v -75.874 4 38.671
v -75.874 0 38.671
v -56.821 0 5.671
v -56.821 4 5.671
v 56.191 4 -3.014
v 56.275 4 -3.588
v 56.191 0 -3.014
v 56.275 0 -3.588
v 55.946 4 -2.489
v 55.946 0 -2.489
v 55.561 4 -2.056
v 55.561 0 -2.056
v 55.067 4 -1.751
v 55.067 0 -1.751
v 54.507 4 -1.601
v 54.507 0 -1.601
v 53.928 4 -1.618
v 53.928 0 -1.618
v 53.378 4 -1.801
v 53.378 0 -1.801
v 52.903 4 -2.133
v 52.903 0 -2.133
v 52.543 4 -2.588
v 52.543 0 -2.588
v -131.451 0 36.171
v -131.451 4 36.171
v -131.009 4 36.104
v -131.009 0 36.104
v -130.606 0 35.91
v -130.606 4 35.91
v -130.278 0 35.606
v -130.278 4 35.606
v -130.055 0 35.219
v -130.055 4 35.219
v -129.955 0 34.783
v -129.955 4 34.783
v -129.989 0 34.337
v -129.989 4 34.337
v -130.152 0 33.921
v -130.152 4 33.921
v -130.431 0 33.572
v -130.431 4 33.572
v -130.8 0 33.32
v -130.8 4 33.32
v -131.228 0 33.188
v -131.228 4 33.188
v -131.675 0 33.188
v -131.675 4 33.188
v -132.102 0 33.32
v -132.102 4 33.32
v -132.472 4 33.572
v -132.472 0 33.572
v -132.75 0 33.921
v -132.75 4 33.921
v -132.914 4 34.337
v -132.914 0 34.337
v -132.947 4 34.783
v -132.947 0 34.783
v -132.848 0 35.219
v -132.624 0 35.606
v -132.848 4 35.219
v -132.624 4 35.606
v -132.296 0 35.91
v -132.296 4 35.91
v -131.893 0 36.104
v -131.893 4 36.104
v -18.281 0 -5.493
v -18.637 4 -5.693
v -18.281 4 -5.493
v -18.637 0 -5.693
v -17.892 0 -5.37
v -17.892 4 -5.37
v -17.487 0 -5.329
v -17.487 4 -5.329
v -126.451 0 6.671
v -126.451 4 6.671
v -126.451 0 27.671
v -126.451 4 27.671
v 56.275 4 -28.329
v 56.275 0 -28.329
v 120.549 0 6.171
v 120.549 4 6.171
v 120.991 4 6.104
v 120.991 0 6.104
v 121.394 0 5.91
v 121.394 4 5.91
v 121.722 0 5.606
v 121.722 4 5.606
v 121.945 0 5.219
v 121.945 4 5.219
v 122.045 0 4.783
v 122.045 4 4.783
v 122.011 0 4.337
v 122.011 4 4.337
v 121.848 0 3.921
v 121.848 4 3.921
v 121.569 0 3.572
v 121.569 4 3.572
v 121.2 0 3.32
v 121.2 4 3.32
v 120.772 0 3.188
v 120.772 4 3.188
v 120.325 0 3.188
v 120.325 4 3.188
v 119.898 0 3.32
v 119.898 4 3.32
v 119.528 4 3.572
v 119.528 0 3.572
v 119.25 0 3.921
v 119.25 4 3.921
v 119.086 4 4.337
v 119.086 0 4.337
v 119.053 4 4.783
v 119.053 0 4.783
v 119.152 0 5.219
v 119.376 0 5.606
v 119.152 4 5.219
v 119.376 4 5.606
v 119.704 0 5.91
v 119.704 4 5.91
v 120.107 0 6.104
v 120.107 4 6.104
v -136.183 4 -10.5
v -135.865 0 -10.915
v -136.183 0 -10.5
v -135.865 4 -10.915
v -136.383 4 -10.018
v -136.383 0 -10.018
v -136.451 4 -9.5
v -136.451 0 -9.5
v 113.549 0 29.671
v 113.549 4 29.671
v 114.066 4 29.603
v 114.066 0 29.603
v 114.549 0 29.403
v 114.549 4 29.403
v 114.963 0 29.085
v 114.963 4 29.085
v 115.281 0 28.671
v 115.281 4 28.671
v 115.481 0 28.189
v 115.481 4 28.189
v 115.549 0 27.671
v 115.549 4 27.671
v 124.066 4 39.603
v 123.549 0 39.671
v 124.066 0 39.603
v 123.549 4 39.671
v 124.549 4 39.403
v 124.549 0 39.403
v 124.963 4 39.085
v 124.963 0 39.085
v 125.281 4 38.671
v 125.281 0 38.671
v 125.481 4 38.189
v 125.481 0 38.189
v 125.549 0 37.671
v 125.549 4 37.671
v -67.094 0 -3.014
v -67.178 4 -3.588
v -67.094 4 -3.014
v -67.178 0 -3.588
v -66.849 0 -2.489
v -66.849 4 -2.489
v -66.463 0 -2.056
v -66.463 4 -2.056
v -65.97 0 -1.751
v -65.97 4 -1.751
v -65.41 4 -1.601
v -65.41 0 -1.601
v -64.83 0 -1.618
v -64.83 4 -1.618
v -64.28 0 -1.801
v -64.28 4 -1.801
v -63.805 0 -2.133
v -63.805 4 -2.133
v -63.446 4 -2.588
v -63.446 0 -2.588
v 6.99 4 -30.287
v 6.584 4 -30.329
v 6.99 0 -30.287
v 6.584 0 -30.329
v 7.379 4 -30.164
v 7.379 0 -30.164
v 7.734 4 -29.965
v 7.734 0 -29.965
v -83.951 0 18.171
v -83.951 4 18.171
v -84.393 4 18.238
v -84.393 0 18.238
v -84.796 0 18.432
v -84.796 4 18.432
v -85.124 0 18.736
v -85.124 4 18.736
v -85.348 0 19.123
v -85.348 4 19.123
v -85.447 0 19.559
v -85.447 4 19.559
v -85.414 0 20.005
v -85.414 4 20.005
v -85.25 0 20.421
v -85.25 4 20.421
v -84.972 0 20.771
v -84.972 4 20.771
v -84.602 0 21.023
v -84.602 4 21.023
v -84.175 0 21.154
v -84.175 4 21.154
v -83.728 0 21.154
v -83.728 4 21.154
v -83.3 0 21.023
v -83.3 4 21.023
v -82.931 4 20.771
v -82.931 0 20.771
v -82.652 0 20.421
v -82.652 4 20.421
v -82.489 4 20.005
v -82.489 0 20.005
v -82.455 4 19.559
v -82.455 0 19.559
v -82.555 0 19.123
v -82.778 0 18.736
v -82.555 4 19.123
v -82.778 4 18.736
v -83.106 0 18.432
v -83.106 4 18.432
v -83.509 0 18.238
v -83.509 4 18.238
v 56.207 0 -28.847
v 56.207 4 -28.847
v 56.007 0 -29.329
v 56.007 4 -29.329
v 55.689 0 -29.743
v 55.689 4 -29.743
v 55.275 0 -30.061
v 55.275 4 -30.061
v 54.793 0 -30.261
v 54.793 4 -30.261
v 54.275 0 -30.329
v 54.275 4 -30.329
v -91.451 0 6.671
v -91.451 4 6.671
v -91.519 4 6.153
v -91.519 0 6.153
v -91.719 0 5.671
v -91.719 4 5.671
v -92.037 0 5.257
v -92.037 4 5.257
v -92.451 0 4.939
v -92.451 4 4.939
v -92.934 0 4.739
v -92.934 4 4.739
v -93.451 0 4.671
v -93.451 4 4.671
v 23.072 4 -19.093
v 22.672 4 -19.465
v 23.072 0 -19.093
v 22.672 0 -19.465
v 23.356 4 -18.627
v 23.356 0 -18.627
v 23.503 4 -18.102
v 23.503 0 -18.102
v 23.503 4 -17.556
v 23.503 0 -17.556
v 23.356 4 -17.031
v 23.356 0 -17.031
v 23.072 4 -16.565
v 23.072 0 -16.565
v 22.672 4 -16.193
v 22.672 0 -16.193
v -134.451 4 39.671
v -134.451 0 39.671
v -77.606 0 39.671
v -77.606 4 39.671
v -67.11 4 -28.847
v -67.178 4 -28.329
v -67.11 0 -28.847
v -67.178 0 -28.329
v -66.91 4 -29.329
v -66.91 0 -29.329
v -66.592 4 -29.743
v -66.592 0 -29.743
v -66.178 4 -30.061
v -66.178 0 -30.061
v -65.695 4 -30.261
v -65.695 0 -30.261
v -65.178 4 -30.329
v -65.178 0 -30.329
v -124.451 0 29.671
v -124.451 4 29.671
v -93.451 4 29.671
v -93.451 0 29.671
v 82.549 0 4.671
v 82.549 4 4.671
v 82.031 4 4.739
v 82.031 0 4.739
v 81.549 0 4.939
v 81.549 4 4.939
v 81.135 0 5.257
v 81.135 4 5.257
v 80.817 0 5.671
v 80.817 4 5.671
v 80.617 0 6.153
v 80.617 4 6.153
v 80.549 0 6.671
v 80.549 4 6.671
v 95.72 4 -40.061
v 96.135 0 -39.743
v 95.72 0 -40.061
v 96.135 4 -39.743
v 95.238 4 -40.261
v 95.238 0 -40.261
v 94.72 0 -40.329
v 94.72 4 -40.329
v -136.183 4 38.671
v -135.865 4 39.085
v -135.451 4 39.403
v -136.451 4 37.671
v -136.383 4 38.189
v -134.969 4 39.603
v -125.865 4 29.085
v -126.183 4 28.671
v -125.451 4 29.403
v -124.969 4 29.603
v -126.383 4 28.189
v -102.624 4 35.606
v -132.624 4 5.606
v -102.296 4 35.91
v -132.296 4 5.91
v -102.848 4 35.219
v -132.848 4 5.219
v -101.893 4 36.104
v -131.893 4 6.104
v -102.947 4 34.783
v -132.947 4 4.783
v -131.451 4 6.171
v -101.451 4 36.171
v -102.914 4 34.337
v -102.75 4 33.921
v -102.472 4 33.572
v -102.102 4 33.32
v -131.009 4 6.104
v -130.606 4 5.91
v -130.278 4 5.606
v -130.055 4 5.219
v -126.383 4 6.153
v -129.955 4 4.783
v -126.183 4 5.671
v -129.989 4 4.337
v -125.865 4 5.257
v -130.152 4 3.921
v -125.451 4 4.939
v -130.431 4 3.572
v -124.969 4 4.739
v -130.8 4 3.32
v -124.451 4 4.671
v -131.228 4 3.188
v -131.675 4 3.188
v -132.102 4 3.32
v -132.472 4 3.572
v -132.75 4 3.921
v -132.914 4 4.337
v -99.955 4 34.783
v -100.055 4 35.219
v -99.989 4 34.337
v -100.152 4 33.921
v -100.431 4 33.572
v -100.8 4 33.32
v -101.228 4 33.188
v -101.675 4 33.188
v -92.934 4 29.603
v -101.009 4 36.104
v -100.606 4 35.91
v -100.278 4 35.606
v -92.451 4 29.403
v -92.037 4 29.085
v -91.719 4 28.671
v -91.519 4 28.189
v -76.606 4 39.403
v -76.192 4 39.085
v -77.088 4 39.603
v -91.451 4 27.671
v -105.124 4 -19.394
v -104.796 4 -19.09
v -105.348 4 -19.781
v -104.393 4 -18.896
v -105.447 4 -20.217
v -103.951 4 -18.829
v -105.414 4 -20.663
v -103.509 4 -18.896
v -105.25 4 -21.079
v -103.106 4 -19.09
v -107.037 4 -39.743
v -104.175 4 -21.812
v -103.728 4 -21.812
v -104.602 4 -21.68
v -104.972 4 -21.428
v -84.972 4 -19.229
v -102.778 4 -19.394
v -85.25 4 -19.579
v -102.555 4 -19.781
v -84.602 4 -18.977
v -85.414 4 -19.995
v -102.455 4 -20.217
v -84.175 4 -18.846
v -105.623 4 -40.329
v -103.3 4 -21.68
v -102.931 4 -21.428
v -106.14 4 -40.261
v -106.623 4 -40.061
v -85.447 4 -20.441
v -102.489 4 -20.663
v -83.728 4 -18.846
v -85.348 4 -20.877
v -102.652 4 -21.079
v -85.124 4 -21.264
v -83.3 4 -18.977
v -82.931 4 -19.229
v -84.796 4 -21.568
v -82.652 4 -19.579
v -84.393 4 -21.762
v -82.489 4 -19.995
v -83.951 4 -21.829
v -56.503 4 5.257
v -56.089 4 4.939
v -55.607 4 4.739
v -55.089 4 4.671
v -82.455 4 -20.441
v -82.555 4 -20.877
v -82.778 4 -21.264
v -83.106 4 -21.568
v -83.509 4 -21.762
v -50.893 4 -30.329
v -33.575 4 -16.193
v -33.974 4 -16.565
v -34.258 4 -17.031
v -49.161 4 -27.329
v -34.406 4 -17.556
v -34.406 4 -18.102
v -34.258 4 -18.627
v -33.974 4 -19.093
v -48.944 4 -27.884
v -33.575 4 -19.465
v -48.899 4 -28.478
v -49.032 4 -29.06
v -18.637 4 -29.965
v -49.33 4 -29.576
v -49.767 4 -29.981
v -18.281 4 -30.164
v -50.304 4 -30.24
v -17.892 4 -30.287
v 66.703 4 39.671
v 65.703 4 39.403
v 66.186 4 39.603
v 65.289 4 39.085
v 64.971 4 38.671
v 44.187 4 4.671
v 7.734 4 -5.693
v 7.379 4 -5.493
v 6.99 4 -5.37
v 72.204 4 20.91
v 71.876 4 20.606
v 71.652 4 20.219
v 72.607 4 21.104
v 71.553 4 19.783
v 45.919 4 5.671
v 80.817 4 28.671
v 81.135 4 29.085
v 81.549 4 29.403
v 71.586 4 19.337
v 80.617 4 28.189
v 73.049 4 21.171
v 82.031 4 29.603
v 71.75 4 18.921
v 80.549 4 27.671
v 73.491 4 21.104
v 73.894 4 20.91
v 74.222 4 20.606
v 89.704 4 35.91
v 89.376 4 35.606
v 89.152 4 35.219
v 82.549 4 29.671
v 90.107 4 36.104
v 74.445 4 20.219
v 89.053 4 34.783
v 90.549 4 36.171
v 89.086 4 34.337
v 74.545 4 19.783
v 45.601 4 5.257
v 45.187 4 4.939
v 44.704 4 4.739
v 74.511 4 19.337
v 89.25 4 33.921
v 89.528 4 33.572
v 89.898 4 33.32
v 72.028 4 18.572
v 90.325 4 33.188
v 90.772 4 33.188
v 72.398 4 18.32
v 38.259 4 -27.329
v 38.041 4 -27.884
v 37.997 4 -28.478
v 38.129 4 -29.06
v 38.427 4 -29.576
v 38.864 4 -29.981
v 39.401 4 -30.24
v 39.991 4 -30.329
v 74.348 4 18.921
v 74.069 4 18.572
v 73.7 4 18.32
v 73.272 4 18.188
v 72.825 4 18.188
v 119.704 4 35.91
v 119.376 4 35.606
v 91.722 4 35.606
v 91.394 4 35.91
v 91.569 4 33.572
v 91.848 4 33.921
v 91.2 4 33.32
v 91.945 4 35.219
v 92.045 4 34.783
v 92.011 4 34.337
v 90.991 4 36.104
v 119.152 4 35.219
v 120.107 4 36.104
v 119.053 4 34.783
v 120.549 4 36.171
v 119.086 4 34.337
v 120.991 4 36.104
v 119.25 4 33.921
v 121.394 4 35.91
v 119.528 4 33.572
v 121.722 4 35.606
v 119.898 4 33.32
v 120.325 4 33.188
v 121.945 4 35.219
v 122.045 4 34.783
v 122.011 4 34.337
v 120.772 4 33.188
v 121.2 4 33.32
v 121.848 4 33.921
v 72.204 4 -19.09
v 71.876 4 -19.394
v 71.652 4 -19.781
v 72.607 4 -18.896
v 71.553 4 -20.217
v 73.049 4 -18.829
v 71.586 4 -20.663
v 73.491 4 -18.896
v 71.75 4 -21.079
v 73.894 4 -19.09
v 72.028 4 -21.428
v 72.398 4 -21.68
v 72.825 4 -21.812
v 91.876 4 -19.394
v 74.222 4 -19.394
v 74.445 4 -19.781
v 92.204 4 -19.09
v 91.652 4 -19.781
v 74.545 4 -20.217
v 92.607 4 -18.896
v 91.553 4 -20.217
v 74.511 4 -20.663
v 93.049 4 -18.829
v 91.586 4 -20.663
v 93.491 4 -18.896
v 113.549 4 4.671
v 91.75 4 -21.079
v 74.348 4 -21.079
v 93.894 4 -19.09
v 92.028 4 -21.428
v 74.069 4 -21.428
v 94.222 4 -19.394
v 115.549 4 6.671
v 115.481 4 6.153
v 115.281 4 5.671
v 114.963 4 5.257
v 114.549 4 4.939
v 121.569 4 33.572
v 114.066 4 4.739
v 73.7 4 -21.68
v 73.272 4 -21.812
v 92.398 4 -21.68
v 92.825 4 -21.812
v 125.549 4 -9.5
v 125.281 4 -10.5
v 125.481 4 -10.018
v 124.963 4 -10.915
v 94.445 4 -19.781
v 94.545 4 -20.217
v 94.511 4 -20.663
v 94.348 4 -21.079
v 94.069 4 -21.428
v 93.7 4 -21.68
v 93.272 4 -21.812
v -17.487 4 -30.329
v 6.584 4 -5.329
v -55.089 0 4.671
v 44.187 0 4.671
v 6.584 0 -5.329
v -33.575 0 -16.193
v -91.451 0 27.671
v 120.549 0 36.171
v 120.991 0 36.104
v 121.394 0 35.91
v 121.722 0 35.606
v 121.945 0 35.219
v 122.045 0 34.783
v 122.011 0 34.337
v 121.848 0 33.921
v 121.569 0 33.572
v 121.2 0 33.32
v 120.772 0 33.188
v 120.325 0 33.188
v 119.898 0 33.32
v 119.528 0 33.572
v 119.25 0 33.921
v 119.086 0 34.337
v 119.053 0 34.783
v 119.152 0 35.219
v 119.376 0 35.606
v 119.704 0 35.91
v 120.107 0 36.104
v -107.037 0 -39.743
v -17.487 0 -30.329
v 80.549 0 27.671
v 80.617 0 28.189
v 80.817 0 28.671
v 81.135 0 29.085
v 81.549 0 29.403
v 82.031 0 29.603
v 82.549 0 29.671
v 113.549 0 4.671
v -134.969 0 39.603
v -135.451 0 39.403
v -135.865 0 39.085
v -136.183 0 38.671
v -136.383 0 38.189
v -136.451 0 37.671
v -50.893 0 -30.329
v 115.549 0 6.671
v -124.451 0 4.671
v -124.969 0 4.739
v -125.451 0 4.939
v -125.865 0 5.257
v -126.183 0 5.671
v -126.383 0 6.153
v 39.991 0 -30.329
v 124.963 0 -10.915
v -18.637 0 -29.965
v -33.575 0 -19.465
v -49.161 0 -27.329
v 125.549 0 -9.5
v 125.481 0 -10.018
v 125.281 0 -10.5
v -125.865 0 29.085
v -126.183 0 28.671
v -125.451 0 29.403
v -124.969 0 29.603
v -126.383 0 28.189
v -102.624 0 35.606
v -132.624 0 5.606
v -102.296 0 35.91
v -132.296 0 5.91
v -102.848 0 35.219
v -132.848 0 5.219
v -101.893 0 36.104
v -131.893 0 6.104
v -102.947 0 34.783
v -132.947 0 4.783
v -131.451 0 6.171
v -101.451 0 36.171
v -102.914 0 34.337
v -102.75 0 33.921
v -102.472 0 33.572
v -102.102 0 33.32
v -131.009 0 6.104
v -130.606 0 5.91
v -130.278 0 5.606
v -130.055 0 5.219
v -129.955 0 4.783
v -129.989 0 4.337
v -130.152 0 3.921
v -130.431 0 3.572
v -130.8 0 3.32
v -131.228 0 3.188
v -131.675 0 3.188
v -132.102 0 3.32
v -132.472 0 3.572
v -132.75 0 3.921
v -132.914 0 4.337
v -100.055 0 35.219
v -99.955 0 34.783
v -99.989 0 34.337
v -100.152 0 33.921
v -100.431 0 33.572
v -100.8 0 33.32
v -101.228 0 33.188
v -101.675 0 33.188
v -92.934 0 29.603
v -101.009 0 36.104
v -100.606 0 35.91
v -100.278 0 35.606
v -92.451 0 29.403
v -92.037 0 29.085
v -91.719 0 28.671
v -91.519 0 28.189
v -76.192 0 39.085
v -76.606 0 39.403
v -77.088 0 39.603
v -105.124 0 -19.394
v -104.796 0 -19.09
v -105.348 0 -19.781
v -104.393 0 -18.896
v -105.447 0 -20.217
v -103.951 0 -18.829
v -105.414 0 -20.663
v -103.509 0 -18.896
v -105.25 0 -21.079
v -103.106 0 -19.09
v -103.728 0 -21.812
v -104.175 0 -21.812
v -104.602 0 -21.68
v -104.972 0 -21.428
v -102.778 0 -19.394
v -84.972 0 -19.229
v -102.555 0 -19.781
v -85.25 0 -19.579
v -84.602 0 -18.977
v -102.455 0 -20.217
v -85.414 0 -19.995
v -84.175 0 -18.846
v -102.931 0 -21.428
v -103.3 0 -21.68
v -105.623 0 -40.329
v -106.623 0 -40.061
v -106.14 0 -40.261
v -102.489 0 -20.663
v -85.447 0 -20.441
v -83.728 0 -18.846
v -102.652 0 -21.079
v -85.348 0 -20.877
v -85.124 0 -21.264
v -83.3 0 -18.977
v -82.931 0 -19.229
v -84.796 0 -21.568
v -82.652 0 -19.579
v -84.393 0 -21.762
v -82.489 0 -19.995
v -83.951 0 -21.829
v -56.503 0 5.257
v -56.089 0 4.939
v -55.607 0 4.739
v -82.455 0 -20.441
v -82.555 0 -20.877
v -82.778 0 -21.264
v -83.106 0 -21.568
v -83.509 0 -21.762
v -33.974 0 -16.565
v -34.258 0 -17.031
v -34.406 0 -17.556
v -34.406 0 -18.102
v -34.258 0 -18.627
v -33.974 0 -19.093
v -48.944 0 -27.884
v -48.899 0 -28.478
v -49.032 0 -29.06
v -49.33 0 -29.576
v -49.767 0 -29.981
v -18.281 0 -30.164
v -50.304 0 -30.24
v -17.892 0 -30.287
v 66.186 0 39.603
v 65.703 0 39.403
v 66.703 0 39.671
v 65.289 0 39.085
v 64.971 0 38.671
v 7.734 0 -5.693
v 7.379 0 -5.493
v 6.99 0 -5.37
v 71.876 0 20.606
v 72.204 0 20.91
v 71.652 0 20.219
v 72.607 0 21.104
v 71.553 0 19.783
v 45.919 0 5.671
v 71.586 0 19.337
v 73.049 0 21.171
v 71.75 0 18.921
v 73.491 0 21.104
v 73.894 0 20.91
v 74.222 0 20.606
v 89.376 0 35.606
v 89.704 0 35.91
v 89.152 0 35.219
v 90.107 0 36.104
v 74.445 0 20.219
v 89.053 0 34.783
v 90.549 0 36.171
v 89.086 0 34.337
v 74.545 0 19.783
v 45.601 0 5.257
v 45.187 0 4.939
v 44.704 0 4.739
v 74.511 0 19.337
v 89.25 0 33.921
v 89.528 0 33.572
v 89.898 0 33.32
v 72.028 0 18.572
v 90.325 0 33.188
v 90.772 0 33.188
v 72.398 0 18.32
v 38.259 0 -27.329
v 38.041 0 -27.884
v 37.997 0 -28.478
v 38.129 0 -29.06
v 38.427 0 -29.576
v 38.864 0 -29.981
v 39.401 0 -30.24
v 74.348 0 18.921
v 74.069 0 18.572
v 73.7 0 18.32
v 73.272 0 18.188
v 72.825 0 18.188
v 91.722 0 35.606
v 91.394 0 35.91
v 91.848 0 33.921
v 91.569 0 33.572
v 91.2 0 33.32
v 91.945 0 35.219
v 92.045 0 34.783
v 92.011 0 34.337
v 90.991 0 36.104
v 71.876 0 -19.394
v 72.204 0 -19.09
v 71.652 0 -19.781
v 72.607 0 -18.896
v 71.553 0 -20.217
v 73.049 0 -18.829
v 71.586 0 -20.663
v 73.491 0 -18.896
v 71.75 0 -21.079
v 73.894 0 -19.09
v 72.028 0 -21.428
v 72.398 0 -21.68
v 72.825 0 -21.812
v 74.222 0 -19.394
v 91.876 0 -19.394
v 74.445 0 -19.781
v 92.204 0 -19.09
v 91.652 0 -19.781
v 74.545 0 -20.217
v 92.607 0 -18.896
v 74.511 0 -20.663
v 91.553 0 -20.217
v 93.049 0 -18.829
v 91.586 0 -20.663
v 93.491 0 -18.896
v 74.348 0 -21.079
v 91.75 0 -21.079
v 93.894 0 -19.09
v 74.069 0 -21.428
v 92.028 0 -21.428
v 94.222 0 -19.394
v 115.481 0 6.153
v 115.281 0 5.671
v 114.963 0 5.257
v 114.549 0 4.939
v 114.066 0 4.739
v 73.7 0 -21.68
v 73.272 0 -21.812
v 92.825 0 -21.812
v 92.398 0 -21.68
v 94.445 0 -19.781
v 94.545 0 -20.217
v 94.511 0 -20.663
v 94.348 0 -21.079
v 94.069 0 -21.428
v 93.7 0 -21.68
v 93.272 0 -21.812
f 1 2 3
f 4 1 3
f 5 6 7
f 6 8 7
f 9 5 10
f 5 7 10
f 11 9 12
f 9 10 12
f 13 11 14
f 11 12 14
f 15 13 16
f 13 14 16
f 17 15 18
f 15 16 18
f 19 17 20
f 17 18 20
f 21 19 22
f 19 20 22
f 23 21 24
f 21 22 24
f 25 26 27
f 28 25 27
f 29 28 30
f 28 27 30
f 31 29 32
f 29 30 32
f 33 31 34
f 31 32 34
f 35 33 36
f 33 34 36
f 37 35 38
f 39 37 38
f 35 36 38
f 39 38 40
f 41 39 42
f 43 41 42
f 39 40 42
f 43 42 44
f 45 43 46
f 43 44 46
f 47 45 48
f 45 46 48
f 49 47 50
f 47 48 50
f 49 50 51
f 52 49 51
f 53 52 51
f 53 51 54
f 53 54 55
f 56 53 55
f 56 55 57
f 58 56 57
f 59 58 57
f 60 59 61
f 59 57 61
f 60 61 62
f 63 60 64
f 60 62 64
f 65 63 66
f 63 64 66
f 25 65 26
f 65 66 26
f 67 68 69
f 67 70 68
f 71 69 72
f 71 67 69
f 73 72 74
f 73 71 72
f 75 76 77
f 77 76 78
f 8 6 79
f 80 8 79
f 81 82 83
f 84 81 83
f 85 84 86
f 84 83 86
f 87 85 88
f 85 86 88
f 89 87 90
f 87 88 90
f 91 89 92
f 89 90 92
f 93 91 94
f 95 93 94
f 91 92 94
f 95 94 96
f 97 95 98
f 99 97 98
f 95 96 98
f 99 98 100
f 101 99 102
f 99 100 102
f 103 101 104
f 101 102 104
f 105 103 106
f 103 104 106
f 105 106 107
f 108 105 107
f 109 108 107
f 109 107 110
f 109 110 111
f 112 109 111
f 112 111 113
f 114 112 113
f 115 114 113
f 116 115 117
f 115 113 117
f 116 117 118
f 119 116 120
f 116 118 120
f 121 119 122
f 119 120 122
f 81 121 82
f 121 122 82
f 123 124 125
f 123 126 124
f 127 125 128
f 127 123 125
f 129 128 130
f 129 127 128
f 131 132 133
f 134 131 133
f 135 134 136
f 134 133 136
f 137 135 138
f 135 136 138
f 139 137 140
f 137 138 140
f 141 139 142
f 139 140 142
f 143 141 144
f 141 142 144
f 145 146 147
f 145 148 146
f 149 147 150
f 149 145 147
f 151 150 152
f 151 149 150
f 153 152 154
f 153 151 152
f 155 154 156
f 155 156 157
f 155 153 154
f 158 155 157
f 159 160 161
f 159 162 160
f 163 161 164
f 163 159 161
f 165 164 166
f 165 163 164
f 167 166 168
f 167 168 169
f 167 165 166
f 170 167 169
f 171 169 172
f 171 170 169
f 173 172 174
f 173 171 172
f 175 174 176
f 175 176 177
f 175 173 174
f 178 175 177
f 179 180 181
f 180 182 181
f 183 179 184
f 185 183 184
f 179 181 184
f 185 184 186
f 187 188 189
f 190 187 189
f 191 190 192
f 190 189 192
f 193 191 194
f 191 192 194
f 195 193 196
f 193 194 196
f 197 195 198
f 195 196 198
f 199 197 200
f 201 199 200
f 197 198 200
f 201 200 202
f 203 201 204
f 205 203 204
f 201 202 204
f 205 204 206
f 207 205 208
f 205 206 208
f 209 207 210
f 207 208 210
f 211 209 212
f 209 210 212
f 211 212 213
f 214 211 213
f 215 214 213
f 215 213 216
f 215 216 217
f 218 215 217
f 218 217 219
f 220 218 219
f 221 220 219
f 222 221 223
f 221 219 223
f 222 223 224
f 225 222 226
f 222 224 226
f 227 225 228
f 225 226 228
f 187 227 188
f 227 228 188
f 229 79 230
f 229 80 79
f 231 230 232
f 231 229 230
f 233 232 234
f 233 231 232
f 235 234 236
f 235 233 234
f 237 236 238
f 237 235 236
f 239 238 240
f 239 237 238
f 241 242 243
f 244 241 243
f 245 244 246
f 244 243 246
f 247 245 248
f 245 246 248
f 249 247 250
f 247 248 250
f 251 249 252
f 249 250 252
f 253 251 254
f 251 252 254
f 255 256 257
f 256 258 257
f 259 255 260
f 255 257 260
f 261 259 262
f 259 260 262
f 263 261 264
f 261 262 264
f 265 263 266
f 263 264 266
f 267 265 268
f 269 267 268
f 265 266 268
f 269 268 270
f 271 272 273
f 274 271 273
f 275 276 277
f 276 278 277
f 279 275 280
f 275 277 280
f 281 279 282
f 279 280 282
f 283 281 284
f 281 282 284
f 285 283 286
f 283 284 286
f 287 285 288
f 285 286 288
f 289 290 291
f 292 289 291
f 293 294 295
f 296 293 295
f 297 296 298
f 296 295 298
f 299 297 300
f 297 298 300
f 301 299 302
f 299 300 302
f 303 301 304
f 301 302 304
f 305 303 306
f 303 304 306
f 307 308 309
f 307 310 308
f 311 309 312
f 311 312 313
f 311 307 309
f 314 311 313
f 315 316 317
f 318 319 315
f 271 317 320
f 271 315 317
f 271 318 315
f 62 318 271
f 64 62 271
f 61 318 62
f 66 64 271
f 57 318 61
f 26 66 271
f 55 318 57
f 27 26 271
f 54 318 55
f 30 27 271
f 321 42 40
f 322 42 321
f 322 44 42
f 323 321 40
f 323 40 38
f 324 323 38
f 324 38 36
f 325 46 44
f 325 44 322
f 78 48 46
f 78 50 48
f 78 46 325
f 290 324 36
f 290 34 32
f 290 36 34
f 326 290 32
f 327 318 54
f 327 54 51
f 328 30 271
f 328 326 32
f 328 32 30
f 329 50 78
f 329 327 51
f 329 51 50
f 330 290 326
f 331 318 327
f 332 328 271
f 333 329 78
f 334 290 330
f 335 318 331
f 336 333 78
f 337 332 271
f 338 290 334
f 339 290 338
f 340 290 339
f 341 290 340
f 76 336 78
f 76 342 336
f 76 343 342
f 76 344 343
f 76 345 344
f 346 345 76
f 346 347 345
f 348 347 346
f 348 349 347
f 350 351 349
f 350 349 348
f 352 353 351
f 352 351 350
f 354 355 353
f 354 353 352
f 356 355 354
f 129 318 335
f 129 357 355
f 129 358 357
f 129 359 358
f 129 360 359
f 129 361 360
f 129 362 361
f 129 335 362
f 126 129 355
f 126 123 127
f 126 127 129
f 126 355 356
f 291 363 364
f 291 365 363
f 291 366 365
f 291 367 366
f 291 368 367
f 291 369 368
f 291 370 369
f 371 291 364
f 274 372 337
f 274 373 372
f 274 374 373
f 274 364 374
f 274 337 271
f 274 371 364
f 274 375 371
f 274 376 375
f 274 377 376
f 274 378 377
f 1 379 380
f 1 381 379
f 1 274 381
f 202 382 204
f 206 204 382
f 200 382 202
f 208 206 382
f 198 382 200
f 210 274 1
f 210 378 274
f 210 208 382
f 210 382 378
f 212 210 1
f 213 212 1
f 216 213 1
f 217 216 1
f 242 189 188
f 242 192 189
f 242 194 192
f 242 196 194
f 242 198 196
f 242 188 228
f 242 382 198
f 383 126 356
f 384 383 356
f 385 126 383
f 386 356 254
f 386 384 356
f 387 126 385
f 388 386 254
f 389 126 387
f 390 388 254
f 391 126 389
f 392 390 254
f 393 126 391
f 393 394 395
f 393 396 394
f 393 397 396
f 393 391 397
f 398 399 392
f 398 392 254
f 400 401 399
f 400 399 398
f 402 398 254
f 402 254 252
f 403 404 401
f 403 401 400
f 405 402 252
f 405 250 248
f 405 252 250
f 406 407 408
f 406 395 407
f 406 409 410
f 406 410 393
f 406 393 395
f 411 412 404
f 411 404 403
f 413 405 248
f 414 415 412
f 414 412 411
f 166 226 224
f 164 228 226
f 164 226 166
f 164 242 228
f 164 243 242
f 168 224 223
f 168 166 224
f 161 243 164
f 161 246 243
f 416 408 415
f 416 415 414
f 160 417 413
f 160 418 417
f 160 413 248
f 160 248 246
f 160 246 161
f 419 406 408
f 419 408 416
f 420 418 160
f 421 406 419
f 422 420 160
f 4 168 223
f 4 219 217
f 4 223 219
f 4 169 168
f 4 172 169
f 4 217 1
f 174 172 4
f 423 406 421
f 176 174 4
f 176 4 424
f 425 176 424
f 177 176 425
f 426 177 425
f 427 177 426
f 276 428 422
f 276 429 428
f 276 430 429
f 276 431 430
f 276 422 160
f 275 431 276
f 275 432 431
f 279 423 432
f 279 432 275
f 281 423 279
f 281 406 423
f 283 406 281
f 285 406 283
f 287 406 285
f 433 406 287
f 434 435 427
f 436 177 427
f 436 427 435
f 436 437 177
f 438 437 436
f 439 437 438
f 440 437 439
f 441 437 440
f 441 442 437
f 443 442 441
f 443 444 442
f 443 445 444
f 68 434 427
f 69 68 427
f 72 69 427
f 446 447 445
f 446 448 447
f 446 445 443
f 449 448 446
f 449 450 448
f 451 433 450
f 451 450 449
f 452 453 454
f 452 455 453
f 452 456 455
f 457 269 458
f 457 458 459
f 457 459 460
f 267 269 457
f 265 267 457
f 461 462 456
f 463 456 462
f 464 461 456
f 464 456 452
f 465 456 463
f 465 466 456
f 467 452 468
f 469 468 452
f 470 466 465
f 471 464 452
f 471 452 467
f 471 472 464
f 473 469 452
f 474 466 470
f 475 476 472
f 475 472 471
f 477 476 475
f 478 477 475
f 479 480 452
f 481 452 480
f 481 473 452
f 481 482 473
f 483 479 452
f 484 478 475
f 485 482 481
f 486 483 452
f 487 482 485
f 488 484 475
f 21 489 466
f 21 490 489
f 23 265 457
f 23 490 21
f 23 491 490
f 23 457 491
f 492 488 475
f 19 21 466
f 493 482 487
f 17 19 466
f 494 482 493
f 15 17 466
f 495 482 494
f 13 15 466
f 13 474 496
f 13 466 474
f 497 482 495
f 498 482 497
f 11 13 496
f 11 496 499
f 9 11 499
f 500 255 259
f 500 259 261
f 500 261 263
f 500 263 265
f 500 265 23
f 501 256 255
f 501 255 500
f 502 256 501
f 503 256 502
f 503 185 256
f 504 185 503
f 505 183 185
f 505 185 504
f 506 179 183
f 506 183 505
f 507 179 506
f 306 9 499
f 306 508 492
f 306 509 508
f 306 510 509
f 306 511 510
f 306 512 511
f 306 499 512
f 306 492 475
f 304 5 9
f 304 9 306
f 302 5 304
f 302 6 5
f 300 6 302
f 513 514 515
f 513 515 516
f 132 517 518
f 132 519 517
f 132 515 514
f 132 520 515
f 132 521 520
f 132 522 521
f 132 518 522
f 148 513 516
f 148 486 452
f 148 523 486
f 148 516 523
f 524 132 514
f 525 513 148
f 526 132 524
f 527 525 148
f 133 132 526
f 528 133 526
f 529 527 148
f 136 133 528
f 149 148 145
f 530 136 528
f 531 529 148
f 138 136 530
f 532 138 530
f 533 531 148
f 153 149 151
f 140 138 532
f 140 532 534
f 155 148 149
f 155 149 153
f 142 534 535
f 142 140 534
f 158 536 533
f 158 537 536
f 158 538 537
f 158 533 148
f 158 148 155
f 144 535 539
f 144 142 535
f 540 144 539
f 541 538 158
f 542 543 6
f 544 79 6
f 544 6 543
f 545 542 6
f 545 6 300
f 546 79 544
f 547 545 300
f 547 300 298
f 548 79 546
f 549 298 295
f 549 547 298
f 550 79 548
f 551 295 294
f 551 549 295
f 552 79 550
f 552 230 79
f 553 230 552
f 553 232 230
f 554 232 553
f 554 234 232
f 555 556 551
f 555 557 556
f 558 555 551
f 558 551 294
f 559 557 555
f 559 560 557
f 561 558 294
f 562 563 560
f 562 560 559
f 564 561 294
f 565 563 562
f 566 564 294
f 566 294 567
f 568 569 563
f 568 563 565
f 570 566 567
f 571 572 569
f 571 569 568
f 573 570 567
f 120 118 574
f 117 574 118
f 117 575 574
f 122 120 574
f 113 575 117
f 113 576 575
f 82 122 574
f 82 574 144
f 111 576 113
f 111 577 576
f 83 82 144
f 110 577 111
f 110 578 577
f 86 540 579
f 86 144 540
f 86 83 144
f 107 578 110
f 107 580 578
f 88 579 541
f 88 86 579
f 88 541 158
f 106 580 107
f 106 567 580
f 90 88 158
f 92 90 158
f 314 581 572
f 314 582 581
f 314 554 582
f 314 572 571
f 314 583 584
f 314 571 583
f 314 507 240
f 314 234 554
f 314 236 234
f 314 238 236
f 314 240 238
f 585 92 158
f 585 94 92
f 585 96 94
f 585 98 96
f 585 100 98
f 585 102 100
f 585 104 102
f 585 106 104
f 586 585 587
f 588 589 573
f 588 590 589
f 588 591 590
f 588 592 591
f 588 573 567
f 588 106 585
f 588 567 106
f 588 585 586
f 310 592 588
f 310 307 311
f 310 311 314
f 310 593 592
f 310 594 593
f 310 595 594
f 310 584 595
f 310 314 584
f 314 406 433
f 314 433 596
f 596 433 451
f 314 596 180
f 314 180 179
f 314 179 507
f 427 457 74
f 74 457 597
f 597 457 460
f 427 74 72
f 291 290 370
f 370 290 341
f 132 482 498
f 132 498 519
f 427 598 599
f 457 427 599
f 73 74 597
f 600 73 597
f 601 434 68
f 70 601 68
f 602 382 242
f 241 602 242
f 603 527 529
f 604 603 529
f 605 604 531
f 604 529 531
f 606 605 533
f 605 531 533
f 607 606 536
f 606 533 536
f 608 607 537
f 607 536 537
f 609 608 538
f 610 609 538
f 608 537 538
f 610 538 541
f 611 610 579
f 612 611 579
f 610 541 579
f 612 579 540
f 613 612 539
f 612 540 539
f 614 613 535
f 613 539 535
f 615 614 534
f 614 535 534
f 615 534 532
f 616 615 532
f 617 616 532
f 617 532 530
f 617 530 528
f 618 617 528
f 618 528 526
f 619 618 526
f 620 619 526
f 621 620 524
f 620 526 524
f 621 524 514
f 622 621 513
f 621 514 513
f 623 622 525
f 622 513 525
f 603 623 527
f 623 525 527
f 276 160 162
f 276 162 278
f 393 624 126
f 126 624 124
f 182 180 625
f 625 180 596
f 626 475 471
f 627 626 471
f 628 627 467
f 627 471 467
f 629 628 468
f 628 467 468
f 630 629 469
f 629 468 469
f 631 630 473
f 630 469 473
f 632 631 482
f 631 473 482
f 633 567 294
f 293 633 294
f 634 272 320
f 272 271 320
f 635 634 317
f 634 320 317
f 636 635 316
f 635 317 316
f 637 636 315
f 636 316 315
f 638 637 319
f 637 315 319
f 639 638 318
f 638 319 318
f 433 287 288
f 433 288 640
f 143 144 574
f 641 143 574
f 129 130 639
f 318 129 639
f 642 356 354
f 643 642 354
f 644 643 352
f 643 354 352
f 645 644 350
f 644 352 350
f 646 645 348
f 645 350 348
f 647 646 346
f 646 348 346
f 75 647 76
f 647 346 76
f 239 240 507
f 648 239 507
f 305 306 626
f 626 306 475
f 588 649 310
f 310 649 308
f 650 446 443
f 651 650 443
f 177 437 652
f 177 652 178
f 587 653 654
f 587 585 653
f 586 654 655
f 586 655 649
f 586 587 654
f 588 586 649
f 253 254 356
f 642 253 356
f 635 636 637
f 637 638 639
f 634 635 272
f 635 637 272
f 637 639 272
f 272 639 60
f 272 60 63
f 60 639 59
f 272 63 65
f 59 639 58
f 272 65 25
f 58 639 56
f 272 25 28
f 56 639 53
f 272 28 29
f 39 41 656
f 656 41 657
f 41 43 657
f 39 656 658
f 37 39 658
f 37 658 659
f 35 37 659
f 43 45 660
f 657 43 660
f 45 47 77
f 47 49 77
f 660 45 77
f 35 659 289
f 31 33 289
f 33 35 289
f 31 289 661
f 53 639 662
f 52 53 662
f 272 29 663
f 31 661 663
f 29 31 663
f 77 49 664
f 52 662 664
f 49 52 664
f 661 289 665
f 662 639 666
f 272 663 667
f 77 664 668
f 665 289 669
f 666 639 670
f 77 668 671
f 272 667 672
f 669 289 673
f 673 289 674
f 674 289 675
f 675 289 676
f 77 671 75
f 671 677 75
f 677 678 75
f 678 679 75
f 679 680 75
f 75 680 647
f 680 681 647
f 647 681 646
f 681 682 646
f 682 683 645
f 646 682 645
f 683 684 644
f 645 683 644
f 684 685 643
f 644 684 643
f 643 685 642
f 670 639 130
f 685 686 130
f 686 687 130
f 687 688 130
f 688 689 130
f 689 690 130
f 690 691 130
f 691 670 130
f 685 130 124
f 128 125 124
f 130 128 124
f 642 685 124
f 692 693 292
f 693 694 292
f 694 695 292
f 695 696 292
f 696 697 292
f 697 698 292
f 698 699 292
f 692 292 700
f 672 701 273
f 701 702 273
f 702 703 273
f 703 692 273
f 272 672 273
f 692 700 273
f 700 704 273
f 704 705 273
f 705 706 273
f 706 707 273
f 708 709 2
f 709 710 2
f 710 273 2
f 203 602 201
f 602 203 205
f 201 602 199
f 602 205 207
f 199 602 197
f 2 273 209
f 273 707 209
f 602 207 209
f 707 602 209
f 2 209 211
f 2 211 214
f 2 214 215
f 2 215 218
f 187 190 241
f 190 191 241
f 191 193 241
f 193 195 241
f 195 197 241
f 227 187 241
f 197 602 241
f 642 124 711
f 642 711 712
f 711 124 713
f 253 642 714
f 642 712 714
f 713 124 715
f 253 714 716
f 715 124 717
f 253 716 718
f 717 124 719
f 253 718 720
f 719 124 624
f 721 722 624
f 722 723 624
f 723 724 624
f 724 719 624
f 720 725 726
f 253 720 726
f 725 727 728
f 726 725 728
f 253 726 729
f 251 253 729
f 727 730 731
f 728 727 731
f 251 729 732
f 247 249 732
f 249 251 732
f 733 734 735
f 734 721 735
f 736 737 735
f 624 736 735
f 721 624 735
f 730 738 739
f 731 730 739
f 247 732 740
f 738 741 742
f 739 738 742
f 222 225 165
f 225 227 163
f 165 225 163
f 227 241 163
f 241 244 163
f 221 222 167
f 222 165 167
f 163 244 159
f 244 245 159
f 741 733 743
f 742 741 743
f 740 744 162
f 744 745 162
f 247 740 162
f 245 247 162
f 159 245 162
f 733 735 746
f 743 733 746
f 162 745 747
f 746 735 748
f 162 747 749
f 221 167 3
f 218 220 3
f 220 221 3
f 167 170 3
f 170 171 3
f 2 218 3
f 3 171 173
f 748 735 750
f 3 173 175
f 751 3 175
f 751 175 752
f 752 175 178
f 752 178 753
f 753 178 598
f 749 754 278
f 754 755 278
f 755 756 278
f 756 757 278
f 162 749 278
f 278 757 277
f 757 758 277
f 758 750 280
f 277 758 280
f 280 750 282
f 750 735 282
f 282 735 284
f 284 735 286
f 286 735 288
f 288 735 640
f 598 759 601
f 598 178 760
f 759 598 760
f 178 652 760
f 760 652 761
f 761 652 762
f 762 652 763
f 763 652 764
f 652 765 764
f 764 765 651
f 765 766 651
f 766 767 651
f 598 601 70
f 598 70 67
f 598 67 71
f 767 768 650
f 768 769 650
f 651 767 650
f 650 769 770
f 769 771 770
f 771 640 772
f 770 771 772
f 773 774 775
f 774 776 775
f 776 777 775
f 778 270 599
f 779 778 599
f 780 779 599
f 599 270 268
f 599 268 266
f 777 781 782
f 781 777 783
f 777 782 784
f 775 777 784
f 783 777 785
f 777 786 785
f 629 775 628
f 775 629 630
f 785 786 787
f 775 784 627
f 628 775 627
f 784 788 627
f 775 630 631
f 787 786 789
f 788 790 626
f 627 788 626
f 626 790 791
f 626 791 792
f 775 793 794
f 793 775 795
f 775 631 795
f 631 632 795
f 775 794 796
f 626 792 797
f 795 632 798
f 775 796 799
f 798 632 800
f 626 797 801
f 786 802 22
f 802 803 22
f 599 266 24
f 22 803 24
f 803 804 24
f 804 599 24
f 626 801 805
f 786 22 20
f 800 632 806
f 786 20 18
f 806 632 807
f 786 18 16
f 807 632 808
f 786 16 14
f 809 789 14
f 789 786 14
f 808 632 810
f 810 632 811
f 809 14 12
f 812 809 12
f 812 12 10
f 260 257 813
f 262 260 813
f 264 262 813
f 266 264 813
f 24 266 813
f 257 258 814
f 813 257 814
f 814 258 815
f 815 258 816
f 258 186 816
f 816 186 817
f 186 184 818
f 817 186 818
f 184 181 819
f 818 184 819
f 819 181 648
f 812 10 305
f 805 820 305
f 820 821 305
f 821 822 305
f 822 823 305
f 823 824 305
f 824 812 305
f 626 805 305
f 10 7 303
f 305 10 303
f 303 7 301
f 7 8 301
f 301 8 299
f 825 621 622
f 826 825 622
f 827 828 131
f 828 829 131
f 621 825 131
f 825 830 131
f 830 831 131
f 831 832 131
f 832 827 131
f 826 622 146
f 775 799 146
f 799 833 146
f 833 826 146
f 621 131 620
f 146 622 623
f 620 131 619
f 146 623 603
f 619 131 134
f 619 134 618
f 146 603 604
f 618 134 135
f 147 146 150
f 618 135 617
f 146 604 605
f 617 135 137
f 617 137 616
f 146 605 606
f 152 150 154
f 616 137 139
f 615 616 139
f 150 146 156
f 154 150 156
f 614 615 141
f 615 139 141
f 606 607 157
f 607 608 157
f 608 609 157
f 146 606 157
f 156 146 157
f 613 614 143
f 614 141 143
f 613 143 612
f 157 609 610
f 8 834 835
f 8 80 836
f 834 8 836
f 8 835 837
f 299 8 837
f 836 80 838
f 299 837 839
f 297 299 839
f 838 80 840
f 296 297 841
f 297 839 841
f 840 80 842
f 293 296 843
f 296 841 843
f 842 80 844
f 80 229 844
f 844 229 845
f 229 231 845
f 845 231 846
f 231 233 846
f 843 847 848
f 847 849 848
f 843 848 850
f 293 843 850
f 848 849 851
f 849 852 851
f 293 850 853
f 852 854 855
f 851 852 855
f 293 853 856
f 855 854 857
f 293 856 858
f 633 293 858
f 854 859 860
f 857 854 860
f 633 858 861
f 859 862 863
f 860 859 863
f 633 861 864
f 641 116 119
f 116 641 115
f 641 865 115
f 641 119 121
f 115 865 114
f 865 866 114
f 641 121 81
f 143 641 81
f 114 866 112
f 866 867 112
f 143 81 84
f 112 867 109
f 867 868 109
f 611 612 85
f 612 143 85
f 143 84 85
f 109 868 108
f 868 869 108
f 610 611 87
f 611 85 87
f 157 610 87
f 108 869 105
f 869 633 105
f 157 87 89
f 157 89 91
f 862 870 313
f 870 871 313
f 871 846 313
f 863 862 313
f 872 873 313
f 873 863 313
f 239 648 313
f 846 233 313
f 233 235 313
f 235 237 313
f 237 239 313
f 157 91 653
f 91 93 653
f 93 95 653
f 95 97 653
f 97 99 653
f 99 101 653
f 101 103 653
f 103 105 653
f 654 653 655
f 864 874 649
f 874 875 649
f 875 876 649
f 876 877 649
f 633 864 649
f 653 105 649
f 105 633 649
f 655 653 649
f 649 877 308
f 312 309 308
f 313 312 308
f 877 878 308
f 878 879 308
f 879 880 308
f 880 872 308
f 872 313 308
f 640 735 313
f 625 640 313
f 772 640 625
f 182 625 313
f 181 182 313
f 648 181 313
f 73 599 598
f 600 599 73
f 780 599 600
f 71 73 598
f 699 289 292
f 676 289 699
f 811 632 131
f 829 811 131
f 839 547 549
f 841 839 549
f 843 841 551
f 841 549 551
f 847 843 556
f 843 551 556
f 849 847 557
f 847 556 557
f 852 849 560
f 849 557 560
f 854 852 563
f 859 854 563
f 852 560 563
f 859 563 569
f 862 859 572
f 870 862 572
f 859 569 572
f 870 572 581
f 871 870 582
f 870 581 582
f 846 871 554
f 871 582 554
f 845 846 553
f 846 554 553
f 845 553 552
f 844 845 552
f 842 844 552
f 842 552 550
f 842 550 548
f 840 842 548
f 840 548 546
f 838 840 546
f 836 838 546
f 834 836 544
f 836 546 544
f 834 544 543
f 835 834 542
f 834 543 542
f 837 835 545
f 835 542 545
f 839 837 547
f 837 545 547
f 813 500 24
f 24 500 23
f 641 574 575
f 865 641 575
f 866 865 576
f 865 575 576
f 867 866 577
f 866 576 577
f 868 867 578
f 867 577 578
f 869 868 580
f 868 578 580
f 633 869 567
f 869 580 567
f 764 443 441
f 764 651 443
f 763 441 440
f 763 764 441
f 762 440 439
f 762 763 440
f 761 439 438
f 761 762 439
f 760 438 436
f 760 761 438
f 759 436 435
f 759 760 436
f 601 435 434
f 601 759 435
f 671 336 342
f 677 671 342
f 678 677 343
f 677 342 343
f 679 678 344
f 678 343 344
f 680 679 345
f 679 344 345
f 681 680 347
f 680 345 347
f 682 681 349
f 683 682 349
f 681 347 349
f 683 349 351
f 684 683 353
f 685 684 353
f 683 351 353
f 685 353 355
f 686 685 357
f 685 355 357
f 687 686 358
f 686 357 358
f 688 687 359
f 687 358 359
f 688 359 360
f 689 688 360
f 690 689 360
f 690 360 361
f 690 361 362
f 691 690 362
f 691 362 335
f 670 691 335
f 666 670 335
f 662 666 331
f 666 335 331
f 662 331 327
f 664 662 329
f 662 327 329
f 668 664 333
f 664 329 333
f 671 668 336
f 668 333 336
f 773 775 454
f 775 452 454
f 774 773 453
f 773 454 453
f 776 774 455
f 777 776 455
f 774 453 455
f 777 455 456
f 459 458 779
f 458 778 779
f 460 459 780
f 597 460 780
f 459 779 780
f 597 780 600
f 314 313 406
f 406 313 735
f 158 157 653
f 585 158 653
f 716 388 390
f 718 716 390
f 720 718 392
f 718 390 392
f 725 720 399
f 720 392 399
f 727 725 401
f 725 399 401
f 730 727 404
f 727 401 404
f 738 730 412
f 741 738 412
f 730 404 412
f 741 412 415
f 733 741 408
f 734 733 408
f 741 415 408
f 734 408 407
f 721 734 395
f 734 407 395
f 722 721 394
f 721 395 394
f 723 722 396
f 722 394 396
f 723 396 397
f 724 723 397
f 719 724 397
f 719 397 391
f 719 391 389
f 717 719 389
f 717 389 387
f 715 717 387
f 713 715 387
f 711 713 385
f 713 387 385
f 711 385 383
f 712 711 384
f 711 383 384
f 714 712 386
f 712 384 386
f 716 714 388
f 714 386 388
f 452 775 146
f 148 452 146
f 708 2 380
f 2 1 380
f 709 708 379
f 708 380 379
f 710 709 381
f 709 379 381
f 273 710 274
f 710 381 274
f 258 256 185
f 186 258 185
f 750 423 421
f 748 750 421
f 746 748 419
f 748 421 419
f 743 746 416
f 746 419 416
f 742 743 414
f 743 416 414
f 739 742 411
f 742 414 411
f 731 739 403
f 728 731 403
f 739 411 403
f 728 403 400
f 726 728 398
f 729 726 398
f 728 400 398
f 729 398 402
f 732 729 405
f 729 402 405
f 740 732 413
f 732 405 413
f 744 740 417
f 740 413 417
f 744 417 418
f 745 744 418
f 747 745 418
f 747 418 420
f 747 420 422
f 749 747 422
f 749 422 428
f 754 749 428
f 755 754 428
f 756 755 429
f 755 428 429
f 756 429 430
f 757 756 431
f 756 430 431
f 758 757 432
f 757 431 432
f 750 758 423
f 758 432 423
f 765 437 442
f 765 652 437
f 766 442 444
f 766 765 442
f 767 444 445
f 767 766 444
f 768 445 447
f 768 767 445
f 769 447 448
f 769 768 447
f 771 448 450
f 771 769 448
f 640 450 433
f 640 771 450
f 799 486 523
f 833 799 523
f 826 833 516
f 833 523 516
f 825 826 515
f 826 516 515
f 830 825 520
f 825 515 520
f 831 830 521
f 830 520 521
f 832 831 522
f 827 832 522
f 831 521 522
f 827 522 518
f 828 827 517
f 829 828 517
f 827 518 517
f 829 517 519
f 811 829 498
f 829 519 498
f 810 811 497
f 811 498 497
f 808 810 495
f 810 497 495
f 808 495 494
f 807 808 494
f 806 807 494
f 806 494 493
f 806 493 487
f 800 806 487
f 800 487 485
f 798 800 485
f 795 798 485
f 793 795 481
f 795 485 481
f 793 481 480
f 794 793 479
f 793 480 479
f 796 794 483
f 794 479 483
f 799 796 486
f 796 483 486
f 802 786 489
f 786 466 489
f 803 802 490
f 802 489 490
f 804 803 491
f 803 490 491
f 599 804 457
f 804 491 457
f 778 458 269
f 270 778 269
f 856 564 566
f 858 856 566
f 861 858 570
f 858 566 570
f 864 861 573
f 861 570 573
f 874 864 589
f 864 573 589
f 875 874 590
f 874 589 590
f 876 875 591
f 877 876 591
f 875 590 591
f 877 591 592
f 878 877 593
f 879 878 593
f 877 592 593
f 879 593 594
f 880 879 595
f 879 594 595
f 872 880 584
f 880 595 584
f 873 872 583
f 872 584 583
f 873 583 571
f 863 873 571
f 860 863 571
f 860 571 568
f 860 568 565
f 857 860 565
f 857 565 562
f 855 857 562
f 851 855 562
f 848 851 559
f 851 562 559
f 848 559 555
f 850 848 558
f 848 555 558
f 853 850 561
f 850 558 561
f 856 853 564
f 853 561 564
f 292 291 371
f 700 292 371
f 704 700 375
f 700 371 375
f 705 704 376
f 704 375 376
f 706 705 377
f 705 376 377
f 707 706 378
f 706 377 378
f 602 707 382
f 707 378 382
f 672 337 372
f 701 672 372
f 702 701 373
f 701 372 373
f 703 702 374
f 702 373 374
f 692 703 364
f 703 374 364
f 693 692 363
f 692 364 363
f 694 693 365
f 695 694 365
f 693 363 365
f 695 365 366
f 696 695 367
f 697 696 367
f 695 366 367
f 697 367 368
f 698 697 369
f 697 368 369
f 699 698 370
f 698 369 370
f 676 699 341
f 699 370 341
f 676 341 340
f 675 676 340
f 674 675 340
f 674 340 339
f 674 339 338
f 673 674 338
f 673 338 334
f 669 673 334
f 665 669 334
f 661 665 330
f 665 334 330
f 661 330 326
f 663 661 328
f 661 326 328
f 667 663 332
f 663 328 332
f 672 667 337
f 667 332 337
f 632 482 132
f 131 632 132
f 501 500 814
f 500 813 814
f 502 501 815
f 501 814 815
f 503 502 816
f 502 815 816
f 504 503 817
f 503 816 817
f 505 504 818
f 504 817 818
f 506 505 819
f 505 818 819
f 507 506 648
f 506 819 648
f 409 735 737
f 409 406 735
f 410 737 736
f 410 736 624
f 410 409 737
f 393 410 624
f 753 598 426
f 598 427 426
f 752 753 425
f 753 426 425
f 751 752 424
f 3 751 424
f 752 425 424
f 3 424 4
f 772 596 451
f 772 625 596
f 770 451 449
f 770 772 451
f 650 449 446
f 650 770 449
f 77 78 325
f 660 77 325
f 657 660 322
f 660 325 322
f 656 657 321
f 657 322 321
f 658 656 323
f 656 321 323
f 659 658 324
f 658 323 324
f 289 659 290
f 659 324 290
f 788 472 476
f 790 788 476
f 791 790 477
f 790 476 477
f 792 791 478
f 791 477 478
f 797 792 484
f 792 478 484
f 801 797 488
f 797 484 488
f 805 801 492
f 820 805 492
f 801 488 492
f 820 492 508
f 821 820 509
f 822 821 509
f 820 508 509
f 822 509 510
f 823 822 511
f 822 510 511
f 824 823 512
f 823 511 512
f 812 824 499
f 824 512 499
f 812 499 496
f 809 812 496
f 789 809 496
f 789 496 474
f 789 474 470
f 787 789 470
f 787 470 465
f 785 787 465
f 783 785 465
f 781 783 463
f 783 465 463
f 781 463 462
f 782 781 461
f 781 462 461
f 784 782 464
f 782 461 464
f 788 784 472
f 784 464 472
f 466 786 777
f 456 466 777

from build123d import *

# Parameters (mm, degrees)
EXTRUDE_1_DEPTH     = 4
CUT_EXTRUDE_1_DEPTH = 4
CUT_EXTRUDE_2_DEPTH = 4
CUT_EXTRUDE_3_DEPTH = 4
FILLET_1_R          = 2
FILLET_2_R          = 2
SKETCH_5_R          = 1.5
CUT_EXTRUDE_4_DEPTH = 4
SKETCH_6_R          = 1.5
CUT_EXTRUDE_5_DEPTH = 4
SKETCH_7_R          = 1.5
CUT_EXTRUDE_6_DEPTH = 4
SKETCH_8_R          = 1.5
CUT_EXTRUDE_7_DEPTH = 4
SKETCH_9_R          = 1.5
CUT_EXTRUDE_8_DEPTH = 4
FILLET_3_R          = 2


with BuildPart() as part:
    # 草图1 → 凸台-拉伸1 (new body)
    with BuildSketch(Plane(origin=(0, 0, 0), x_dir=(1, 0, 0), z_dir=(0, 1, 0))):
        Polygon((65.54875717, -39.671128107), (125.54875717, -39.671128107), (125.54875717, 10.328871893), (95.54875717, 40.328871893), (-106.45124283, 40.328871893), (-136.45124283, 10.328871893), (-136.45124283, -39.671128107), (-76.45124283, -39.671128107), (-56.243983408, -4.671128107), (45.341497749, -4.671128107), align=None)
    extrude(amount=EXTRUDE_1_DEPTH)

    # 草图2 → 切除-拉伸1 (cut)
    with BuildSketch(Plane(origin=(0, 4, 0), x_dir=(1, 0, 0), z_dir=(0, 1, 0))):
        Polygon((7.216878365, 30.328871893), (-18.119364025, 30.328871893), (-35.90248566, 17.828871893), (-18.119364025, 5.328871893), (7.216878365, 5.328871893), (25, 17.828871893), align=None)
    extrude(amount=-CUT_EXTRUDE_1_DEPTH, mode=Mode.SUBTRACT)

    # 草图3 → 切除-拉伸2 (cut)
    with BuildSketch(Plane(origin=(0, 4, 0), x_dir=(1, 0, 0), z_dir=(0, 1, 0))):
        Polygon((-67.177653117, 30.328871893), (-47.429348489, 30.328871893), (-67.177653117, -3.876195086), align=None)
        Polygon((56.275167457, -3.876195086), (56.275167457, 30.328871893), (36.52686283, 30.328871893), align=None)
    extrude(amount=-CUT_EXTRUDE_2_DEPTH, mode=Mode.SUBTRACT)

    # 草图4 → 切除-拉伸3 (cut)
    with BuildSketch(Plane(origin=(0, 4, 0), x_dir=(1, 0, 0), z_dir=(0, 1, 0))):
        with BuildLine():
            Line((-124.45124283, -29.671128107), (-93.45124283, -29.671128107))
            ThreePointArc((-93.45124283, -29.671128107), (-92.037029267, -29.085341669), (-91.45124283, -27.671128107))
            Line((-91.45124283, -27.671128107), (-91.45124283, -6.671128107))
            ThreePointArc((-91.45124283, -6.671128107), (-92.037029267, -5.256914545), (-93.45124283, -4.671128107))
            Line((-93.45124283, -4.671128107), (-124.45124283, -4.671128107))
            ThreePointArc((-124.45124283, -4.671128107), (-125.865456392, -5.256914545), (-126.45124283, -6.671128107))
            Line((-126.45124283, -6.671128107), (-126.45124283, -27.671128107))
            ThreePointArc((-126.45124283, -27.671128107), (-125.865456392, -29.085341669), (-124.45124283, -29.671128107))
        make_face()
        with BuildLine():
            Line((115.54875717, -27.671128107), (115.54875717, -6.671128107))
            ThreePointArc((115.54875717, -6.671128107), (114.962970733, -5.256914545), (113.54875717, -4.671128107))
            Line((113.54875717, -4.671128107), (82.54875717, -4.671128107))
            ThreePointArc((82.54875717, -4.671128107), (81.134543608, -5.256914545), (80.54875717, -6.671128107))
            Line((80.54875717, -6.671128107), (80.54875717, -27.671128107))
            ThreePointArc((80.54875717, -27.671128107), (81.134543608, -29.085341669), (82.54875717, -29.671128107))
            Line((82.54875717, -29.671128107), (113.54875717, -29.671128107))
            ThreePointArc((113.54875717, -29.671128107), (114.962970733, -29.085341669), (115.54875717, -27.671128107))
        make_face()
    extrude(amount=-CUT_EXTRUDE_3_DEPTH, mode=Mode.SUBTRACT)

    # 圆角1
    fillet_1_edges = [part.edges().sort_by_distance(p)[0] for p in [
        (-67.177653117, 2, 3.876195086),
        (-67.177653117, 2, -30.328871893),
        (-47.429348489, 2, -30.328871893),
        (56.275167457, 2, 3.876195086),
        (36.52686283, 2, -30.328871893),
        (56.275167457, 2, -30.328871893),
    ]]
    fillet(fillet_1_edges, radius=FILLET_1_R)

    # 圆角2
    fillet_2_edges = [part.edges().sort_by_distance(p)[0] for p in [
        (-136.45124283, 2, -10.328871893),
        (-106.45124283, 2, -40.328871893),
        (95.54875717, 2, -40.328871893),
        (125.54875717, 2, -10.328871893),
        (125.54875717, 2, 39.671128107),
        (65.54875717, 2, 39.671128107),
        (45.341497749, 2, 4.671128107),
        (-56.243983408, 2, 4.671128107),
        (-76.45124283, 2, 39.671128107),
        (-136.45124283, 2, 39.671128107),
    ]]
    fillet(fillet_2_edges, radius=FILLET_2_R)

    # 草图5 → 切除-拉伸4 (cut)
    with BuildSketch(Plane(origin=(0, 4, 0), x_dir=(1, 0, 0), z_dir=(0, 1, 0))):
        with Locations(Location((73.04875717, -19.671128107, 0), (0, 0, 270))):
            Circle(SKETCH_5_R)
        with Locations(Location((73.04875717, 20.328871893, 0), (0, 0, 270))):
            Circle(SKETCH_5_R)
        with Locations(Location((-83.95124283, -19.671128107, 0), (0, 0, 90))):
            Circle(SKETCH_5_R)
        with Locations(Location((-83.95124283, 20.328871893, 0), (0, 0, 90))):
            Circle(SKETCH_5_R)
    extrude(amount=-CUT_EXTRUDE_4_DEPTH, mode=Mode.SUBTRACT)

    # 草图6 → 切除-拉伸5 (cut)
    with BuildSketch(Plane(origin=(0, 4, 0), x_dir=(1, 0, 0), z_dir=(0, 1, 0))):
        with Locations(Location((120.54875717, -34.671128107, 0), (0, 0, 270))):
            Circle(SKETCH_6_R)
        with Locations(Location((93.04875717, 20.328871893, 0), (0, 0, 270))):
            Circle(SKETCH_6_R)
        with Locations(Location((90.54875717, -34.671128107, 0), (0, 0, 270))):
            Circle(SKETCH_6_R)
    extrude(amount=-CUT_EXTRUDE_5_DEPTH, mode=Mode.SUBTRACT)

    # 草图7 → 切除-拉伸6 (cut)
    with BuildSketch(Plane(origin=(0, 4, 0), x_dir=(1, 0, 0), z_dir=(0, 1, 0))):
        with Locations(Location((120.54875717, -4.671128107, 0), (0, 0, 270))):
            Circle(SKETCH_7_R)
    extrude(amount=-CUT_EXTRUDE_6_DEPTH, mode=Mode.SUBTRACT)

    # 草图8 → 切除-拉伸7 (cut)
    with BuildSketch(Plane(origin=(0, 4, 0), x_dir=(1, 0, 0), z_dir=(0, 1, 0))):
        with Locations(Location((-131.45124283, -34.671128107, 0), (0, 0, 270))):
            Circle(SKETCH_8_R)
        with Locations(Location((-101.45124283, -34.671128107, 0), (0, 0, 270))):
            Circle(SKETCH_8_R)
        with Locations(Location((-131.45124283, -4.671128107, 0), (0, 0, 270))):
            Circle(SKETCH_8_R)
    extrude(amount=-CUT_EXTRUDE_7_DEPTH, mode=Mode.SUBTRACT)

    # 草图9 → 切除-拉伸8 (cut)
    with BuildSketch(Plane(origin=(0, 4, 0), x_dir=(1, 0, 0), z_dir=(0, 1, 0))):
        with Locations(Location((-103.95124283, 20.328871893, 0), (0, 0, 270))):
            Circle(SKETCH_9_R)
    extrude(amount=-CUT_EXTRUDE_8_DEPTH, mode=Mode.SUBTRACT)

    # 圆角3
    fillet_3_edges = [part.edges().sort_by_distance(p)[0] for p in [
        (7.216878365, 2, -30.328871893),
        (25, 2, -17.828871893),
        (7.216878365, 2, -5.328871893),
        (-18.119364025, 2, -5.328871893),
        (-35.90248566, 2, -17.828871893),
        (-18.119364025, 2, -30.328871893),
    ]]
    fillet(fillet_3_edges, radius=FILLET_3_R)


solid = part.part
